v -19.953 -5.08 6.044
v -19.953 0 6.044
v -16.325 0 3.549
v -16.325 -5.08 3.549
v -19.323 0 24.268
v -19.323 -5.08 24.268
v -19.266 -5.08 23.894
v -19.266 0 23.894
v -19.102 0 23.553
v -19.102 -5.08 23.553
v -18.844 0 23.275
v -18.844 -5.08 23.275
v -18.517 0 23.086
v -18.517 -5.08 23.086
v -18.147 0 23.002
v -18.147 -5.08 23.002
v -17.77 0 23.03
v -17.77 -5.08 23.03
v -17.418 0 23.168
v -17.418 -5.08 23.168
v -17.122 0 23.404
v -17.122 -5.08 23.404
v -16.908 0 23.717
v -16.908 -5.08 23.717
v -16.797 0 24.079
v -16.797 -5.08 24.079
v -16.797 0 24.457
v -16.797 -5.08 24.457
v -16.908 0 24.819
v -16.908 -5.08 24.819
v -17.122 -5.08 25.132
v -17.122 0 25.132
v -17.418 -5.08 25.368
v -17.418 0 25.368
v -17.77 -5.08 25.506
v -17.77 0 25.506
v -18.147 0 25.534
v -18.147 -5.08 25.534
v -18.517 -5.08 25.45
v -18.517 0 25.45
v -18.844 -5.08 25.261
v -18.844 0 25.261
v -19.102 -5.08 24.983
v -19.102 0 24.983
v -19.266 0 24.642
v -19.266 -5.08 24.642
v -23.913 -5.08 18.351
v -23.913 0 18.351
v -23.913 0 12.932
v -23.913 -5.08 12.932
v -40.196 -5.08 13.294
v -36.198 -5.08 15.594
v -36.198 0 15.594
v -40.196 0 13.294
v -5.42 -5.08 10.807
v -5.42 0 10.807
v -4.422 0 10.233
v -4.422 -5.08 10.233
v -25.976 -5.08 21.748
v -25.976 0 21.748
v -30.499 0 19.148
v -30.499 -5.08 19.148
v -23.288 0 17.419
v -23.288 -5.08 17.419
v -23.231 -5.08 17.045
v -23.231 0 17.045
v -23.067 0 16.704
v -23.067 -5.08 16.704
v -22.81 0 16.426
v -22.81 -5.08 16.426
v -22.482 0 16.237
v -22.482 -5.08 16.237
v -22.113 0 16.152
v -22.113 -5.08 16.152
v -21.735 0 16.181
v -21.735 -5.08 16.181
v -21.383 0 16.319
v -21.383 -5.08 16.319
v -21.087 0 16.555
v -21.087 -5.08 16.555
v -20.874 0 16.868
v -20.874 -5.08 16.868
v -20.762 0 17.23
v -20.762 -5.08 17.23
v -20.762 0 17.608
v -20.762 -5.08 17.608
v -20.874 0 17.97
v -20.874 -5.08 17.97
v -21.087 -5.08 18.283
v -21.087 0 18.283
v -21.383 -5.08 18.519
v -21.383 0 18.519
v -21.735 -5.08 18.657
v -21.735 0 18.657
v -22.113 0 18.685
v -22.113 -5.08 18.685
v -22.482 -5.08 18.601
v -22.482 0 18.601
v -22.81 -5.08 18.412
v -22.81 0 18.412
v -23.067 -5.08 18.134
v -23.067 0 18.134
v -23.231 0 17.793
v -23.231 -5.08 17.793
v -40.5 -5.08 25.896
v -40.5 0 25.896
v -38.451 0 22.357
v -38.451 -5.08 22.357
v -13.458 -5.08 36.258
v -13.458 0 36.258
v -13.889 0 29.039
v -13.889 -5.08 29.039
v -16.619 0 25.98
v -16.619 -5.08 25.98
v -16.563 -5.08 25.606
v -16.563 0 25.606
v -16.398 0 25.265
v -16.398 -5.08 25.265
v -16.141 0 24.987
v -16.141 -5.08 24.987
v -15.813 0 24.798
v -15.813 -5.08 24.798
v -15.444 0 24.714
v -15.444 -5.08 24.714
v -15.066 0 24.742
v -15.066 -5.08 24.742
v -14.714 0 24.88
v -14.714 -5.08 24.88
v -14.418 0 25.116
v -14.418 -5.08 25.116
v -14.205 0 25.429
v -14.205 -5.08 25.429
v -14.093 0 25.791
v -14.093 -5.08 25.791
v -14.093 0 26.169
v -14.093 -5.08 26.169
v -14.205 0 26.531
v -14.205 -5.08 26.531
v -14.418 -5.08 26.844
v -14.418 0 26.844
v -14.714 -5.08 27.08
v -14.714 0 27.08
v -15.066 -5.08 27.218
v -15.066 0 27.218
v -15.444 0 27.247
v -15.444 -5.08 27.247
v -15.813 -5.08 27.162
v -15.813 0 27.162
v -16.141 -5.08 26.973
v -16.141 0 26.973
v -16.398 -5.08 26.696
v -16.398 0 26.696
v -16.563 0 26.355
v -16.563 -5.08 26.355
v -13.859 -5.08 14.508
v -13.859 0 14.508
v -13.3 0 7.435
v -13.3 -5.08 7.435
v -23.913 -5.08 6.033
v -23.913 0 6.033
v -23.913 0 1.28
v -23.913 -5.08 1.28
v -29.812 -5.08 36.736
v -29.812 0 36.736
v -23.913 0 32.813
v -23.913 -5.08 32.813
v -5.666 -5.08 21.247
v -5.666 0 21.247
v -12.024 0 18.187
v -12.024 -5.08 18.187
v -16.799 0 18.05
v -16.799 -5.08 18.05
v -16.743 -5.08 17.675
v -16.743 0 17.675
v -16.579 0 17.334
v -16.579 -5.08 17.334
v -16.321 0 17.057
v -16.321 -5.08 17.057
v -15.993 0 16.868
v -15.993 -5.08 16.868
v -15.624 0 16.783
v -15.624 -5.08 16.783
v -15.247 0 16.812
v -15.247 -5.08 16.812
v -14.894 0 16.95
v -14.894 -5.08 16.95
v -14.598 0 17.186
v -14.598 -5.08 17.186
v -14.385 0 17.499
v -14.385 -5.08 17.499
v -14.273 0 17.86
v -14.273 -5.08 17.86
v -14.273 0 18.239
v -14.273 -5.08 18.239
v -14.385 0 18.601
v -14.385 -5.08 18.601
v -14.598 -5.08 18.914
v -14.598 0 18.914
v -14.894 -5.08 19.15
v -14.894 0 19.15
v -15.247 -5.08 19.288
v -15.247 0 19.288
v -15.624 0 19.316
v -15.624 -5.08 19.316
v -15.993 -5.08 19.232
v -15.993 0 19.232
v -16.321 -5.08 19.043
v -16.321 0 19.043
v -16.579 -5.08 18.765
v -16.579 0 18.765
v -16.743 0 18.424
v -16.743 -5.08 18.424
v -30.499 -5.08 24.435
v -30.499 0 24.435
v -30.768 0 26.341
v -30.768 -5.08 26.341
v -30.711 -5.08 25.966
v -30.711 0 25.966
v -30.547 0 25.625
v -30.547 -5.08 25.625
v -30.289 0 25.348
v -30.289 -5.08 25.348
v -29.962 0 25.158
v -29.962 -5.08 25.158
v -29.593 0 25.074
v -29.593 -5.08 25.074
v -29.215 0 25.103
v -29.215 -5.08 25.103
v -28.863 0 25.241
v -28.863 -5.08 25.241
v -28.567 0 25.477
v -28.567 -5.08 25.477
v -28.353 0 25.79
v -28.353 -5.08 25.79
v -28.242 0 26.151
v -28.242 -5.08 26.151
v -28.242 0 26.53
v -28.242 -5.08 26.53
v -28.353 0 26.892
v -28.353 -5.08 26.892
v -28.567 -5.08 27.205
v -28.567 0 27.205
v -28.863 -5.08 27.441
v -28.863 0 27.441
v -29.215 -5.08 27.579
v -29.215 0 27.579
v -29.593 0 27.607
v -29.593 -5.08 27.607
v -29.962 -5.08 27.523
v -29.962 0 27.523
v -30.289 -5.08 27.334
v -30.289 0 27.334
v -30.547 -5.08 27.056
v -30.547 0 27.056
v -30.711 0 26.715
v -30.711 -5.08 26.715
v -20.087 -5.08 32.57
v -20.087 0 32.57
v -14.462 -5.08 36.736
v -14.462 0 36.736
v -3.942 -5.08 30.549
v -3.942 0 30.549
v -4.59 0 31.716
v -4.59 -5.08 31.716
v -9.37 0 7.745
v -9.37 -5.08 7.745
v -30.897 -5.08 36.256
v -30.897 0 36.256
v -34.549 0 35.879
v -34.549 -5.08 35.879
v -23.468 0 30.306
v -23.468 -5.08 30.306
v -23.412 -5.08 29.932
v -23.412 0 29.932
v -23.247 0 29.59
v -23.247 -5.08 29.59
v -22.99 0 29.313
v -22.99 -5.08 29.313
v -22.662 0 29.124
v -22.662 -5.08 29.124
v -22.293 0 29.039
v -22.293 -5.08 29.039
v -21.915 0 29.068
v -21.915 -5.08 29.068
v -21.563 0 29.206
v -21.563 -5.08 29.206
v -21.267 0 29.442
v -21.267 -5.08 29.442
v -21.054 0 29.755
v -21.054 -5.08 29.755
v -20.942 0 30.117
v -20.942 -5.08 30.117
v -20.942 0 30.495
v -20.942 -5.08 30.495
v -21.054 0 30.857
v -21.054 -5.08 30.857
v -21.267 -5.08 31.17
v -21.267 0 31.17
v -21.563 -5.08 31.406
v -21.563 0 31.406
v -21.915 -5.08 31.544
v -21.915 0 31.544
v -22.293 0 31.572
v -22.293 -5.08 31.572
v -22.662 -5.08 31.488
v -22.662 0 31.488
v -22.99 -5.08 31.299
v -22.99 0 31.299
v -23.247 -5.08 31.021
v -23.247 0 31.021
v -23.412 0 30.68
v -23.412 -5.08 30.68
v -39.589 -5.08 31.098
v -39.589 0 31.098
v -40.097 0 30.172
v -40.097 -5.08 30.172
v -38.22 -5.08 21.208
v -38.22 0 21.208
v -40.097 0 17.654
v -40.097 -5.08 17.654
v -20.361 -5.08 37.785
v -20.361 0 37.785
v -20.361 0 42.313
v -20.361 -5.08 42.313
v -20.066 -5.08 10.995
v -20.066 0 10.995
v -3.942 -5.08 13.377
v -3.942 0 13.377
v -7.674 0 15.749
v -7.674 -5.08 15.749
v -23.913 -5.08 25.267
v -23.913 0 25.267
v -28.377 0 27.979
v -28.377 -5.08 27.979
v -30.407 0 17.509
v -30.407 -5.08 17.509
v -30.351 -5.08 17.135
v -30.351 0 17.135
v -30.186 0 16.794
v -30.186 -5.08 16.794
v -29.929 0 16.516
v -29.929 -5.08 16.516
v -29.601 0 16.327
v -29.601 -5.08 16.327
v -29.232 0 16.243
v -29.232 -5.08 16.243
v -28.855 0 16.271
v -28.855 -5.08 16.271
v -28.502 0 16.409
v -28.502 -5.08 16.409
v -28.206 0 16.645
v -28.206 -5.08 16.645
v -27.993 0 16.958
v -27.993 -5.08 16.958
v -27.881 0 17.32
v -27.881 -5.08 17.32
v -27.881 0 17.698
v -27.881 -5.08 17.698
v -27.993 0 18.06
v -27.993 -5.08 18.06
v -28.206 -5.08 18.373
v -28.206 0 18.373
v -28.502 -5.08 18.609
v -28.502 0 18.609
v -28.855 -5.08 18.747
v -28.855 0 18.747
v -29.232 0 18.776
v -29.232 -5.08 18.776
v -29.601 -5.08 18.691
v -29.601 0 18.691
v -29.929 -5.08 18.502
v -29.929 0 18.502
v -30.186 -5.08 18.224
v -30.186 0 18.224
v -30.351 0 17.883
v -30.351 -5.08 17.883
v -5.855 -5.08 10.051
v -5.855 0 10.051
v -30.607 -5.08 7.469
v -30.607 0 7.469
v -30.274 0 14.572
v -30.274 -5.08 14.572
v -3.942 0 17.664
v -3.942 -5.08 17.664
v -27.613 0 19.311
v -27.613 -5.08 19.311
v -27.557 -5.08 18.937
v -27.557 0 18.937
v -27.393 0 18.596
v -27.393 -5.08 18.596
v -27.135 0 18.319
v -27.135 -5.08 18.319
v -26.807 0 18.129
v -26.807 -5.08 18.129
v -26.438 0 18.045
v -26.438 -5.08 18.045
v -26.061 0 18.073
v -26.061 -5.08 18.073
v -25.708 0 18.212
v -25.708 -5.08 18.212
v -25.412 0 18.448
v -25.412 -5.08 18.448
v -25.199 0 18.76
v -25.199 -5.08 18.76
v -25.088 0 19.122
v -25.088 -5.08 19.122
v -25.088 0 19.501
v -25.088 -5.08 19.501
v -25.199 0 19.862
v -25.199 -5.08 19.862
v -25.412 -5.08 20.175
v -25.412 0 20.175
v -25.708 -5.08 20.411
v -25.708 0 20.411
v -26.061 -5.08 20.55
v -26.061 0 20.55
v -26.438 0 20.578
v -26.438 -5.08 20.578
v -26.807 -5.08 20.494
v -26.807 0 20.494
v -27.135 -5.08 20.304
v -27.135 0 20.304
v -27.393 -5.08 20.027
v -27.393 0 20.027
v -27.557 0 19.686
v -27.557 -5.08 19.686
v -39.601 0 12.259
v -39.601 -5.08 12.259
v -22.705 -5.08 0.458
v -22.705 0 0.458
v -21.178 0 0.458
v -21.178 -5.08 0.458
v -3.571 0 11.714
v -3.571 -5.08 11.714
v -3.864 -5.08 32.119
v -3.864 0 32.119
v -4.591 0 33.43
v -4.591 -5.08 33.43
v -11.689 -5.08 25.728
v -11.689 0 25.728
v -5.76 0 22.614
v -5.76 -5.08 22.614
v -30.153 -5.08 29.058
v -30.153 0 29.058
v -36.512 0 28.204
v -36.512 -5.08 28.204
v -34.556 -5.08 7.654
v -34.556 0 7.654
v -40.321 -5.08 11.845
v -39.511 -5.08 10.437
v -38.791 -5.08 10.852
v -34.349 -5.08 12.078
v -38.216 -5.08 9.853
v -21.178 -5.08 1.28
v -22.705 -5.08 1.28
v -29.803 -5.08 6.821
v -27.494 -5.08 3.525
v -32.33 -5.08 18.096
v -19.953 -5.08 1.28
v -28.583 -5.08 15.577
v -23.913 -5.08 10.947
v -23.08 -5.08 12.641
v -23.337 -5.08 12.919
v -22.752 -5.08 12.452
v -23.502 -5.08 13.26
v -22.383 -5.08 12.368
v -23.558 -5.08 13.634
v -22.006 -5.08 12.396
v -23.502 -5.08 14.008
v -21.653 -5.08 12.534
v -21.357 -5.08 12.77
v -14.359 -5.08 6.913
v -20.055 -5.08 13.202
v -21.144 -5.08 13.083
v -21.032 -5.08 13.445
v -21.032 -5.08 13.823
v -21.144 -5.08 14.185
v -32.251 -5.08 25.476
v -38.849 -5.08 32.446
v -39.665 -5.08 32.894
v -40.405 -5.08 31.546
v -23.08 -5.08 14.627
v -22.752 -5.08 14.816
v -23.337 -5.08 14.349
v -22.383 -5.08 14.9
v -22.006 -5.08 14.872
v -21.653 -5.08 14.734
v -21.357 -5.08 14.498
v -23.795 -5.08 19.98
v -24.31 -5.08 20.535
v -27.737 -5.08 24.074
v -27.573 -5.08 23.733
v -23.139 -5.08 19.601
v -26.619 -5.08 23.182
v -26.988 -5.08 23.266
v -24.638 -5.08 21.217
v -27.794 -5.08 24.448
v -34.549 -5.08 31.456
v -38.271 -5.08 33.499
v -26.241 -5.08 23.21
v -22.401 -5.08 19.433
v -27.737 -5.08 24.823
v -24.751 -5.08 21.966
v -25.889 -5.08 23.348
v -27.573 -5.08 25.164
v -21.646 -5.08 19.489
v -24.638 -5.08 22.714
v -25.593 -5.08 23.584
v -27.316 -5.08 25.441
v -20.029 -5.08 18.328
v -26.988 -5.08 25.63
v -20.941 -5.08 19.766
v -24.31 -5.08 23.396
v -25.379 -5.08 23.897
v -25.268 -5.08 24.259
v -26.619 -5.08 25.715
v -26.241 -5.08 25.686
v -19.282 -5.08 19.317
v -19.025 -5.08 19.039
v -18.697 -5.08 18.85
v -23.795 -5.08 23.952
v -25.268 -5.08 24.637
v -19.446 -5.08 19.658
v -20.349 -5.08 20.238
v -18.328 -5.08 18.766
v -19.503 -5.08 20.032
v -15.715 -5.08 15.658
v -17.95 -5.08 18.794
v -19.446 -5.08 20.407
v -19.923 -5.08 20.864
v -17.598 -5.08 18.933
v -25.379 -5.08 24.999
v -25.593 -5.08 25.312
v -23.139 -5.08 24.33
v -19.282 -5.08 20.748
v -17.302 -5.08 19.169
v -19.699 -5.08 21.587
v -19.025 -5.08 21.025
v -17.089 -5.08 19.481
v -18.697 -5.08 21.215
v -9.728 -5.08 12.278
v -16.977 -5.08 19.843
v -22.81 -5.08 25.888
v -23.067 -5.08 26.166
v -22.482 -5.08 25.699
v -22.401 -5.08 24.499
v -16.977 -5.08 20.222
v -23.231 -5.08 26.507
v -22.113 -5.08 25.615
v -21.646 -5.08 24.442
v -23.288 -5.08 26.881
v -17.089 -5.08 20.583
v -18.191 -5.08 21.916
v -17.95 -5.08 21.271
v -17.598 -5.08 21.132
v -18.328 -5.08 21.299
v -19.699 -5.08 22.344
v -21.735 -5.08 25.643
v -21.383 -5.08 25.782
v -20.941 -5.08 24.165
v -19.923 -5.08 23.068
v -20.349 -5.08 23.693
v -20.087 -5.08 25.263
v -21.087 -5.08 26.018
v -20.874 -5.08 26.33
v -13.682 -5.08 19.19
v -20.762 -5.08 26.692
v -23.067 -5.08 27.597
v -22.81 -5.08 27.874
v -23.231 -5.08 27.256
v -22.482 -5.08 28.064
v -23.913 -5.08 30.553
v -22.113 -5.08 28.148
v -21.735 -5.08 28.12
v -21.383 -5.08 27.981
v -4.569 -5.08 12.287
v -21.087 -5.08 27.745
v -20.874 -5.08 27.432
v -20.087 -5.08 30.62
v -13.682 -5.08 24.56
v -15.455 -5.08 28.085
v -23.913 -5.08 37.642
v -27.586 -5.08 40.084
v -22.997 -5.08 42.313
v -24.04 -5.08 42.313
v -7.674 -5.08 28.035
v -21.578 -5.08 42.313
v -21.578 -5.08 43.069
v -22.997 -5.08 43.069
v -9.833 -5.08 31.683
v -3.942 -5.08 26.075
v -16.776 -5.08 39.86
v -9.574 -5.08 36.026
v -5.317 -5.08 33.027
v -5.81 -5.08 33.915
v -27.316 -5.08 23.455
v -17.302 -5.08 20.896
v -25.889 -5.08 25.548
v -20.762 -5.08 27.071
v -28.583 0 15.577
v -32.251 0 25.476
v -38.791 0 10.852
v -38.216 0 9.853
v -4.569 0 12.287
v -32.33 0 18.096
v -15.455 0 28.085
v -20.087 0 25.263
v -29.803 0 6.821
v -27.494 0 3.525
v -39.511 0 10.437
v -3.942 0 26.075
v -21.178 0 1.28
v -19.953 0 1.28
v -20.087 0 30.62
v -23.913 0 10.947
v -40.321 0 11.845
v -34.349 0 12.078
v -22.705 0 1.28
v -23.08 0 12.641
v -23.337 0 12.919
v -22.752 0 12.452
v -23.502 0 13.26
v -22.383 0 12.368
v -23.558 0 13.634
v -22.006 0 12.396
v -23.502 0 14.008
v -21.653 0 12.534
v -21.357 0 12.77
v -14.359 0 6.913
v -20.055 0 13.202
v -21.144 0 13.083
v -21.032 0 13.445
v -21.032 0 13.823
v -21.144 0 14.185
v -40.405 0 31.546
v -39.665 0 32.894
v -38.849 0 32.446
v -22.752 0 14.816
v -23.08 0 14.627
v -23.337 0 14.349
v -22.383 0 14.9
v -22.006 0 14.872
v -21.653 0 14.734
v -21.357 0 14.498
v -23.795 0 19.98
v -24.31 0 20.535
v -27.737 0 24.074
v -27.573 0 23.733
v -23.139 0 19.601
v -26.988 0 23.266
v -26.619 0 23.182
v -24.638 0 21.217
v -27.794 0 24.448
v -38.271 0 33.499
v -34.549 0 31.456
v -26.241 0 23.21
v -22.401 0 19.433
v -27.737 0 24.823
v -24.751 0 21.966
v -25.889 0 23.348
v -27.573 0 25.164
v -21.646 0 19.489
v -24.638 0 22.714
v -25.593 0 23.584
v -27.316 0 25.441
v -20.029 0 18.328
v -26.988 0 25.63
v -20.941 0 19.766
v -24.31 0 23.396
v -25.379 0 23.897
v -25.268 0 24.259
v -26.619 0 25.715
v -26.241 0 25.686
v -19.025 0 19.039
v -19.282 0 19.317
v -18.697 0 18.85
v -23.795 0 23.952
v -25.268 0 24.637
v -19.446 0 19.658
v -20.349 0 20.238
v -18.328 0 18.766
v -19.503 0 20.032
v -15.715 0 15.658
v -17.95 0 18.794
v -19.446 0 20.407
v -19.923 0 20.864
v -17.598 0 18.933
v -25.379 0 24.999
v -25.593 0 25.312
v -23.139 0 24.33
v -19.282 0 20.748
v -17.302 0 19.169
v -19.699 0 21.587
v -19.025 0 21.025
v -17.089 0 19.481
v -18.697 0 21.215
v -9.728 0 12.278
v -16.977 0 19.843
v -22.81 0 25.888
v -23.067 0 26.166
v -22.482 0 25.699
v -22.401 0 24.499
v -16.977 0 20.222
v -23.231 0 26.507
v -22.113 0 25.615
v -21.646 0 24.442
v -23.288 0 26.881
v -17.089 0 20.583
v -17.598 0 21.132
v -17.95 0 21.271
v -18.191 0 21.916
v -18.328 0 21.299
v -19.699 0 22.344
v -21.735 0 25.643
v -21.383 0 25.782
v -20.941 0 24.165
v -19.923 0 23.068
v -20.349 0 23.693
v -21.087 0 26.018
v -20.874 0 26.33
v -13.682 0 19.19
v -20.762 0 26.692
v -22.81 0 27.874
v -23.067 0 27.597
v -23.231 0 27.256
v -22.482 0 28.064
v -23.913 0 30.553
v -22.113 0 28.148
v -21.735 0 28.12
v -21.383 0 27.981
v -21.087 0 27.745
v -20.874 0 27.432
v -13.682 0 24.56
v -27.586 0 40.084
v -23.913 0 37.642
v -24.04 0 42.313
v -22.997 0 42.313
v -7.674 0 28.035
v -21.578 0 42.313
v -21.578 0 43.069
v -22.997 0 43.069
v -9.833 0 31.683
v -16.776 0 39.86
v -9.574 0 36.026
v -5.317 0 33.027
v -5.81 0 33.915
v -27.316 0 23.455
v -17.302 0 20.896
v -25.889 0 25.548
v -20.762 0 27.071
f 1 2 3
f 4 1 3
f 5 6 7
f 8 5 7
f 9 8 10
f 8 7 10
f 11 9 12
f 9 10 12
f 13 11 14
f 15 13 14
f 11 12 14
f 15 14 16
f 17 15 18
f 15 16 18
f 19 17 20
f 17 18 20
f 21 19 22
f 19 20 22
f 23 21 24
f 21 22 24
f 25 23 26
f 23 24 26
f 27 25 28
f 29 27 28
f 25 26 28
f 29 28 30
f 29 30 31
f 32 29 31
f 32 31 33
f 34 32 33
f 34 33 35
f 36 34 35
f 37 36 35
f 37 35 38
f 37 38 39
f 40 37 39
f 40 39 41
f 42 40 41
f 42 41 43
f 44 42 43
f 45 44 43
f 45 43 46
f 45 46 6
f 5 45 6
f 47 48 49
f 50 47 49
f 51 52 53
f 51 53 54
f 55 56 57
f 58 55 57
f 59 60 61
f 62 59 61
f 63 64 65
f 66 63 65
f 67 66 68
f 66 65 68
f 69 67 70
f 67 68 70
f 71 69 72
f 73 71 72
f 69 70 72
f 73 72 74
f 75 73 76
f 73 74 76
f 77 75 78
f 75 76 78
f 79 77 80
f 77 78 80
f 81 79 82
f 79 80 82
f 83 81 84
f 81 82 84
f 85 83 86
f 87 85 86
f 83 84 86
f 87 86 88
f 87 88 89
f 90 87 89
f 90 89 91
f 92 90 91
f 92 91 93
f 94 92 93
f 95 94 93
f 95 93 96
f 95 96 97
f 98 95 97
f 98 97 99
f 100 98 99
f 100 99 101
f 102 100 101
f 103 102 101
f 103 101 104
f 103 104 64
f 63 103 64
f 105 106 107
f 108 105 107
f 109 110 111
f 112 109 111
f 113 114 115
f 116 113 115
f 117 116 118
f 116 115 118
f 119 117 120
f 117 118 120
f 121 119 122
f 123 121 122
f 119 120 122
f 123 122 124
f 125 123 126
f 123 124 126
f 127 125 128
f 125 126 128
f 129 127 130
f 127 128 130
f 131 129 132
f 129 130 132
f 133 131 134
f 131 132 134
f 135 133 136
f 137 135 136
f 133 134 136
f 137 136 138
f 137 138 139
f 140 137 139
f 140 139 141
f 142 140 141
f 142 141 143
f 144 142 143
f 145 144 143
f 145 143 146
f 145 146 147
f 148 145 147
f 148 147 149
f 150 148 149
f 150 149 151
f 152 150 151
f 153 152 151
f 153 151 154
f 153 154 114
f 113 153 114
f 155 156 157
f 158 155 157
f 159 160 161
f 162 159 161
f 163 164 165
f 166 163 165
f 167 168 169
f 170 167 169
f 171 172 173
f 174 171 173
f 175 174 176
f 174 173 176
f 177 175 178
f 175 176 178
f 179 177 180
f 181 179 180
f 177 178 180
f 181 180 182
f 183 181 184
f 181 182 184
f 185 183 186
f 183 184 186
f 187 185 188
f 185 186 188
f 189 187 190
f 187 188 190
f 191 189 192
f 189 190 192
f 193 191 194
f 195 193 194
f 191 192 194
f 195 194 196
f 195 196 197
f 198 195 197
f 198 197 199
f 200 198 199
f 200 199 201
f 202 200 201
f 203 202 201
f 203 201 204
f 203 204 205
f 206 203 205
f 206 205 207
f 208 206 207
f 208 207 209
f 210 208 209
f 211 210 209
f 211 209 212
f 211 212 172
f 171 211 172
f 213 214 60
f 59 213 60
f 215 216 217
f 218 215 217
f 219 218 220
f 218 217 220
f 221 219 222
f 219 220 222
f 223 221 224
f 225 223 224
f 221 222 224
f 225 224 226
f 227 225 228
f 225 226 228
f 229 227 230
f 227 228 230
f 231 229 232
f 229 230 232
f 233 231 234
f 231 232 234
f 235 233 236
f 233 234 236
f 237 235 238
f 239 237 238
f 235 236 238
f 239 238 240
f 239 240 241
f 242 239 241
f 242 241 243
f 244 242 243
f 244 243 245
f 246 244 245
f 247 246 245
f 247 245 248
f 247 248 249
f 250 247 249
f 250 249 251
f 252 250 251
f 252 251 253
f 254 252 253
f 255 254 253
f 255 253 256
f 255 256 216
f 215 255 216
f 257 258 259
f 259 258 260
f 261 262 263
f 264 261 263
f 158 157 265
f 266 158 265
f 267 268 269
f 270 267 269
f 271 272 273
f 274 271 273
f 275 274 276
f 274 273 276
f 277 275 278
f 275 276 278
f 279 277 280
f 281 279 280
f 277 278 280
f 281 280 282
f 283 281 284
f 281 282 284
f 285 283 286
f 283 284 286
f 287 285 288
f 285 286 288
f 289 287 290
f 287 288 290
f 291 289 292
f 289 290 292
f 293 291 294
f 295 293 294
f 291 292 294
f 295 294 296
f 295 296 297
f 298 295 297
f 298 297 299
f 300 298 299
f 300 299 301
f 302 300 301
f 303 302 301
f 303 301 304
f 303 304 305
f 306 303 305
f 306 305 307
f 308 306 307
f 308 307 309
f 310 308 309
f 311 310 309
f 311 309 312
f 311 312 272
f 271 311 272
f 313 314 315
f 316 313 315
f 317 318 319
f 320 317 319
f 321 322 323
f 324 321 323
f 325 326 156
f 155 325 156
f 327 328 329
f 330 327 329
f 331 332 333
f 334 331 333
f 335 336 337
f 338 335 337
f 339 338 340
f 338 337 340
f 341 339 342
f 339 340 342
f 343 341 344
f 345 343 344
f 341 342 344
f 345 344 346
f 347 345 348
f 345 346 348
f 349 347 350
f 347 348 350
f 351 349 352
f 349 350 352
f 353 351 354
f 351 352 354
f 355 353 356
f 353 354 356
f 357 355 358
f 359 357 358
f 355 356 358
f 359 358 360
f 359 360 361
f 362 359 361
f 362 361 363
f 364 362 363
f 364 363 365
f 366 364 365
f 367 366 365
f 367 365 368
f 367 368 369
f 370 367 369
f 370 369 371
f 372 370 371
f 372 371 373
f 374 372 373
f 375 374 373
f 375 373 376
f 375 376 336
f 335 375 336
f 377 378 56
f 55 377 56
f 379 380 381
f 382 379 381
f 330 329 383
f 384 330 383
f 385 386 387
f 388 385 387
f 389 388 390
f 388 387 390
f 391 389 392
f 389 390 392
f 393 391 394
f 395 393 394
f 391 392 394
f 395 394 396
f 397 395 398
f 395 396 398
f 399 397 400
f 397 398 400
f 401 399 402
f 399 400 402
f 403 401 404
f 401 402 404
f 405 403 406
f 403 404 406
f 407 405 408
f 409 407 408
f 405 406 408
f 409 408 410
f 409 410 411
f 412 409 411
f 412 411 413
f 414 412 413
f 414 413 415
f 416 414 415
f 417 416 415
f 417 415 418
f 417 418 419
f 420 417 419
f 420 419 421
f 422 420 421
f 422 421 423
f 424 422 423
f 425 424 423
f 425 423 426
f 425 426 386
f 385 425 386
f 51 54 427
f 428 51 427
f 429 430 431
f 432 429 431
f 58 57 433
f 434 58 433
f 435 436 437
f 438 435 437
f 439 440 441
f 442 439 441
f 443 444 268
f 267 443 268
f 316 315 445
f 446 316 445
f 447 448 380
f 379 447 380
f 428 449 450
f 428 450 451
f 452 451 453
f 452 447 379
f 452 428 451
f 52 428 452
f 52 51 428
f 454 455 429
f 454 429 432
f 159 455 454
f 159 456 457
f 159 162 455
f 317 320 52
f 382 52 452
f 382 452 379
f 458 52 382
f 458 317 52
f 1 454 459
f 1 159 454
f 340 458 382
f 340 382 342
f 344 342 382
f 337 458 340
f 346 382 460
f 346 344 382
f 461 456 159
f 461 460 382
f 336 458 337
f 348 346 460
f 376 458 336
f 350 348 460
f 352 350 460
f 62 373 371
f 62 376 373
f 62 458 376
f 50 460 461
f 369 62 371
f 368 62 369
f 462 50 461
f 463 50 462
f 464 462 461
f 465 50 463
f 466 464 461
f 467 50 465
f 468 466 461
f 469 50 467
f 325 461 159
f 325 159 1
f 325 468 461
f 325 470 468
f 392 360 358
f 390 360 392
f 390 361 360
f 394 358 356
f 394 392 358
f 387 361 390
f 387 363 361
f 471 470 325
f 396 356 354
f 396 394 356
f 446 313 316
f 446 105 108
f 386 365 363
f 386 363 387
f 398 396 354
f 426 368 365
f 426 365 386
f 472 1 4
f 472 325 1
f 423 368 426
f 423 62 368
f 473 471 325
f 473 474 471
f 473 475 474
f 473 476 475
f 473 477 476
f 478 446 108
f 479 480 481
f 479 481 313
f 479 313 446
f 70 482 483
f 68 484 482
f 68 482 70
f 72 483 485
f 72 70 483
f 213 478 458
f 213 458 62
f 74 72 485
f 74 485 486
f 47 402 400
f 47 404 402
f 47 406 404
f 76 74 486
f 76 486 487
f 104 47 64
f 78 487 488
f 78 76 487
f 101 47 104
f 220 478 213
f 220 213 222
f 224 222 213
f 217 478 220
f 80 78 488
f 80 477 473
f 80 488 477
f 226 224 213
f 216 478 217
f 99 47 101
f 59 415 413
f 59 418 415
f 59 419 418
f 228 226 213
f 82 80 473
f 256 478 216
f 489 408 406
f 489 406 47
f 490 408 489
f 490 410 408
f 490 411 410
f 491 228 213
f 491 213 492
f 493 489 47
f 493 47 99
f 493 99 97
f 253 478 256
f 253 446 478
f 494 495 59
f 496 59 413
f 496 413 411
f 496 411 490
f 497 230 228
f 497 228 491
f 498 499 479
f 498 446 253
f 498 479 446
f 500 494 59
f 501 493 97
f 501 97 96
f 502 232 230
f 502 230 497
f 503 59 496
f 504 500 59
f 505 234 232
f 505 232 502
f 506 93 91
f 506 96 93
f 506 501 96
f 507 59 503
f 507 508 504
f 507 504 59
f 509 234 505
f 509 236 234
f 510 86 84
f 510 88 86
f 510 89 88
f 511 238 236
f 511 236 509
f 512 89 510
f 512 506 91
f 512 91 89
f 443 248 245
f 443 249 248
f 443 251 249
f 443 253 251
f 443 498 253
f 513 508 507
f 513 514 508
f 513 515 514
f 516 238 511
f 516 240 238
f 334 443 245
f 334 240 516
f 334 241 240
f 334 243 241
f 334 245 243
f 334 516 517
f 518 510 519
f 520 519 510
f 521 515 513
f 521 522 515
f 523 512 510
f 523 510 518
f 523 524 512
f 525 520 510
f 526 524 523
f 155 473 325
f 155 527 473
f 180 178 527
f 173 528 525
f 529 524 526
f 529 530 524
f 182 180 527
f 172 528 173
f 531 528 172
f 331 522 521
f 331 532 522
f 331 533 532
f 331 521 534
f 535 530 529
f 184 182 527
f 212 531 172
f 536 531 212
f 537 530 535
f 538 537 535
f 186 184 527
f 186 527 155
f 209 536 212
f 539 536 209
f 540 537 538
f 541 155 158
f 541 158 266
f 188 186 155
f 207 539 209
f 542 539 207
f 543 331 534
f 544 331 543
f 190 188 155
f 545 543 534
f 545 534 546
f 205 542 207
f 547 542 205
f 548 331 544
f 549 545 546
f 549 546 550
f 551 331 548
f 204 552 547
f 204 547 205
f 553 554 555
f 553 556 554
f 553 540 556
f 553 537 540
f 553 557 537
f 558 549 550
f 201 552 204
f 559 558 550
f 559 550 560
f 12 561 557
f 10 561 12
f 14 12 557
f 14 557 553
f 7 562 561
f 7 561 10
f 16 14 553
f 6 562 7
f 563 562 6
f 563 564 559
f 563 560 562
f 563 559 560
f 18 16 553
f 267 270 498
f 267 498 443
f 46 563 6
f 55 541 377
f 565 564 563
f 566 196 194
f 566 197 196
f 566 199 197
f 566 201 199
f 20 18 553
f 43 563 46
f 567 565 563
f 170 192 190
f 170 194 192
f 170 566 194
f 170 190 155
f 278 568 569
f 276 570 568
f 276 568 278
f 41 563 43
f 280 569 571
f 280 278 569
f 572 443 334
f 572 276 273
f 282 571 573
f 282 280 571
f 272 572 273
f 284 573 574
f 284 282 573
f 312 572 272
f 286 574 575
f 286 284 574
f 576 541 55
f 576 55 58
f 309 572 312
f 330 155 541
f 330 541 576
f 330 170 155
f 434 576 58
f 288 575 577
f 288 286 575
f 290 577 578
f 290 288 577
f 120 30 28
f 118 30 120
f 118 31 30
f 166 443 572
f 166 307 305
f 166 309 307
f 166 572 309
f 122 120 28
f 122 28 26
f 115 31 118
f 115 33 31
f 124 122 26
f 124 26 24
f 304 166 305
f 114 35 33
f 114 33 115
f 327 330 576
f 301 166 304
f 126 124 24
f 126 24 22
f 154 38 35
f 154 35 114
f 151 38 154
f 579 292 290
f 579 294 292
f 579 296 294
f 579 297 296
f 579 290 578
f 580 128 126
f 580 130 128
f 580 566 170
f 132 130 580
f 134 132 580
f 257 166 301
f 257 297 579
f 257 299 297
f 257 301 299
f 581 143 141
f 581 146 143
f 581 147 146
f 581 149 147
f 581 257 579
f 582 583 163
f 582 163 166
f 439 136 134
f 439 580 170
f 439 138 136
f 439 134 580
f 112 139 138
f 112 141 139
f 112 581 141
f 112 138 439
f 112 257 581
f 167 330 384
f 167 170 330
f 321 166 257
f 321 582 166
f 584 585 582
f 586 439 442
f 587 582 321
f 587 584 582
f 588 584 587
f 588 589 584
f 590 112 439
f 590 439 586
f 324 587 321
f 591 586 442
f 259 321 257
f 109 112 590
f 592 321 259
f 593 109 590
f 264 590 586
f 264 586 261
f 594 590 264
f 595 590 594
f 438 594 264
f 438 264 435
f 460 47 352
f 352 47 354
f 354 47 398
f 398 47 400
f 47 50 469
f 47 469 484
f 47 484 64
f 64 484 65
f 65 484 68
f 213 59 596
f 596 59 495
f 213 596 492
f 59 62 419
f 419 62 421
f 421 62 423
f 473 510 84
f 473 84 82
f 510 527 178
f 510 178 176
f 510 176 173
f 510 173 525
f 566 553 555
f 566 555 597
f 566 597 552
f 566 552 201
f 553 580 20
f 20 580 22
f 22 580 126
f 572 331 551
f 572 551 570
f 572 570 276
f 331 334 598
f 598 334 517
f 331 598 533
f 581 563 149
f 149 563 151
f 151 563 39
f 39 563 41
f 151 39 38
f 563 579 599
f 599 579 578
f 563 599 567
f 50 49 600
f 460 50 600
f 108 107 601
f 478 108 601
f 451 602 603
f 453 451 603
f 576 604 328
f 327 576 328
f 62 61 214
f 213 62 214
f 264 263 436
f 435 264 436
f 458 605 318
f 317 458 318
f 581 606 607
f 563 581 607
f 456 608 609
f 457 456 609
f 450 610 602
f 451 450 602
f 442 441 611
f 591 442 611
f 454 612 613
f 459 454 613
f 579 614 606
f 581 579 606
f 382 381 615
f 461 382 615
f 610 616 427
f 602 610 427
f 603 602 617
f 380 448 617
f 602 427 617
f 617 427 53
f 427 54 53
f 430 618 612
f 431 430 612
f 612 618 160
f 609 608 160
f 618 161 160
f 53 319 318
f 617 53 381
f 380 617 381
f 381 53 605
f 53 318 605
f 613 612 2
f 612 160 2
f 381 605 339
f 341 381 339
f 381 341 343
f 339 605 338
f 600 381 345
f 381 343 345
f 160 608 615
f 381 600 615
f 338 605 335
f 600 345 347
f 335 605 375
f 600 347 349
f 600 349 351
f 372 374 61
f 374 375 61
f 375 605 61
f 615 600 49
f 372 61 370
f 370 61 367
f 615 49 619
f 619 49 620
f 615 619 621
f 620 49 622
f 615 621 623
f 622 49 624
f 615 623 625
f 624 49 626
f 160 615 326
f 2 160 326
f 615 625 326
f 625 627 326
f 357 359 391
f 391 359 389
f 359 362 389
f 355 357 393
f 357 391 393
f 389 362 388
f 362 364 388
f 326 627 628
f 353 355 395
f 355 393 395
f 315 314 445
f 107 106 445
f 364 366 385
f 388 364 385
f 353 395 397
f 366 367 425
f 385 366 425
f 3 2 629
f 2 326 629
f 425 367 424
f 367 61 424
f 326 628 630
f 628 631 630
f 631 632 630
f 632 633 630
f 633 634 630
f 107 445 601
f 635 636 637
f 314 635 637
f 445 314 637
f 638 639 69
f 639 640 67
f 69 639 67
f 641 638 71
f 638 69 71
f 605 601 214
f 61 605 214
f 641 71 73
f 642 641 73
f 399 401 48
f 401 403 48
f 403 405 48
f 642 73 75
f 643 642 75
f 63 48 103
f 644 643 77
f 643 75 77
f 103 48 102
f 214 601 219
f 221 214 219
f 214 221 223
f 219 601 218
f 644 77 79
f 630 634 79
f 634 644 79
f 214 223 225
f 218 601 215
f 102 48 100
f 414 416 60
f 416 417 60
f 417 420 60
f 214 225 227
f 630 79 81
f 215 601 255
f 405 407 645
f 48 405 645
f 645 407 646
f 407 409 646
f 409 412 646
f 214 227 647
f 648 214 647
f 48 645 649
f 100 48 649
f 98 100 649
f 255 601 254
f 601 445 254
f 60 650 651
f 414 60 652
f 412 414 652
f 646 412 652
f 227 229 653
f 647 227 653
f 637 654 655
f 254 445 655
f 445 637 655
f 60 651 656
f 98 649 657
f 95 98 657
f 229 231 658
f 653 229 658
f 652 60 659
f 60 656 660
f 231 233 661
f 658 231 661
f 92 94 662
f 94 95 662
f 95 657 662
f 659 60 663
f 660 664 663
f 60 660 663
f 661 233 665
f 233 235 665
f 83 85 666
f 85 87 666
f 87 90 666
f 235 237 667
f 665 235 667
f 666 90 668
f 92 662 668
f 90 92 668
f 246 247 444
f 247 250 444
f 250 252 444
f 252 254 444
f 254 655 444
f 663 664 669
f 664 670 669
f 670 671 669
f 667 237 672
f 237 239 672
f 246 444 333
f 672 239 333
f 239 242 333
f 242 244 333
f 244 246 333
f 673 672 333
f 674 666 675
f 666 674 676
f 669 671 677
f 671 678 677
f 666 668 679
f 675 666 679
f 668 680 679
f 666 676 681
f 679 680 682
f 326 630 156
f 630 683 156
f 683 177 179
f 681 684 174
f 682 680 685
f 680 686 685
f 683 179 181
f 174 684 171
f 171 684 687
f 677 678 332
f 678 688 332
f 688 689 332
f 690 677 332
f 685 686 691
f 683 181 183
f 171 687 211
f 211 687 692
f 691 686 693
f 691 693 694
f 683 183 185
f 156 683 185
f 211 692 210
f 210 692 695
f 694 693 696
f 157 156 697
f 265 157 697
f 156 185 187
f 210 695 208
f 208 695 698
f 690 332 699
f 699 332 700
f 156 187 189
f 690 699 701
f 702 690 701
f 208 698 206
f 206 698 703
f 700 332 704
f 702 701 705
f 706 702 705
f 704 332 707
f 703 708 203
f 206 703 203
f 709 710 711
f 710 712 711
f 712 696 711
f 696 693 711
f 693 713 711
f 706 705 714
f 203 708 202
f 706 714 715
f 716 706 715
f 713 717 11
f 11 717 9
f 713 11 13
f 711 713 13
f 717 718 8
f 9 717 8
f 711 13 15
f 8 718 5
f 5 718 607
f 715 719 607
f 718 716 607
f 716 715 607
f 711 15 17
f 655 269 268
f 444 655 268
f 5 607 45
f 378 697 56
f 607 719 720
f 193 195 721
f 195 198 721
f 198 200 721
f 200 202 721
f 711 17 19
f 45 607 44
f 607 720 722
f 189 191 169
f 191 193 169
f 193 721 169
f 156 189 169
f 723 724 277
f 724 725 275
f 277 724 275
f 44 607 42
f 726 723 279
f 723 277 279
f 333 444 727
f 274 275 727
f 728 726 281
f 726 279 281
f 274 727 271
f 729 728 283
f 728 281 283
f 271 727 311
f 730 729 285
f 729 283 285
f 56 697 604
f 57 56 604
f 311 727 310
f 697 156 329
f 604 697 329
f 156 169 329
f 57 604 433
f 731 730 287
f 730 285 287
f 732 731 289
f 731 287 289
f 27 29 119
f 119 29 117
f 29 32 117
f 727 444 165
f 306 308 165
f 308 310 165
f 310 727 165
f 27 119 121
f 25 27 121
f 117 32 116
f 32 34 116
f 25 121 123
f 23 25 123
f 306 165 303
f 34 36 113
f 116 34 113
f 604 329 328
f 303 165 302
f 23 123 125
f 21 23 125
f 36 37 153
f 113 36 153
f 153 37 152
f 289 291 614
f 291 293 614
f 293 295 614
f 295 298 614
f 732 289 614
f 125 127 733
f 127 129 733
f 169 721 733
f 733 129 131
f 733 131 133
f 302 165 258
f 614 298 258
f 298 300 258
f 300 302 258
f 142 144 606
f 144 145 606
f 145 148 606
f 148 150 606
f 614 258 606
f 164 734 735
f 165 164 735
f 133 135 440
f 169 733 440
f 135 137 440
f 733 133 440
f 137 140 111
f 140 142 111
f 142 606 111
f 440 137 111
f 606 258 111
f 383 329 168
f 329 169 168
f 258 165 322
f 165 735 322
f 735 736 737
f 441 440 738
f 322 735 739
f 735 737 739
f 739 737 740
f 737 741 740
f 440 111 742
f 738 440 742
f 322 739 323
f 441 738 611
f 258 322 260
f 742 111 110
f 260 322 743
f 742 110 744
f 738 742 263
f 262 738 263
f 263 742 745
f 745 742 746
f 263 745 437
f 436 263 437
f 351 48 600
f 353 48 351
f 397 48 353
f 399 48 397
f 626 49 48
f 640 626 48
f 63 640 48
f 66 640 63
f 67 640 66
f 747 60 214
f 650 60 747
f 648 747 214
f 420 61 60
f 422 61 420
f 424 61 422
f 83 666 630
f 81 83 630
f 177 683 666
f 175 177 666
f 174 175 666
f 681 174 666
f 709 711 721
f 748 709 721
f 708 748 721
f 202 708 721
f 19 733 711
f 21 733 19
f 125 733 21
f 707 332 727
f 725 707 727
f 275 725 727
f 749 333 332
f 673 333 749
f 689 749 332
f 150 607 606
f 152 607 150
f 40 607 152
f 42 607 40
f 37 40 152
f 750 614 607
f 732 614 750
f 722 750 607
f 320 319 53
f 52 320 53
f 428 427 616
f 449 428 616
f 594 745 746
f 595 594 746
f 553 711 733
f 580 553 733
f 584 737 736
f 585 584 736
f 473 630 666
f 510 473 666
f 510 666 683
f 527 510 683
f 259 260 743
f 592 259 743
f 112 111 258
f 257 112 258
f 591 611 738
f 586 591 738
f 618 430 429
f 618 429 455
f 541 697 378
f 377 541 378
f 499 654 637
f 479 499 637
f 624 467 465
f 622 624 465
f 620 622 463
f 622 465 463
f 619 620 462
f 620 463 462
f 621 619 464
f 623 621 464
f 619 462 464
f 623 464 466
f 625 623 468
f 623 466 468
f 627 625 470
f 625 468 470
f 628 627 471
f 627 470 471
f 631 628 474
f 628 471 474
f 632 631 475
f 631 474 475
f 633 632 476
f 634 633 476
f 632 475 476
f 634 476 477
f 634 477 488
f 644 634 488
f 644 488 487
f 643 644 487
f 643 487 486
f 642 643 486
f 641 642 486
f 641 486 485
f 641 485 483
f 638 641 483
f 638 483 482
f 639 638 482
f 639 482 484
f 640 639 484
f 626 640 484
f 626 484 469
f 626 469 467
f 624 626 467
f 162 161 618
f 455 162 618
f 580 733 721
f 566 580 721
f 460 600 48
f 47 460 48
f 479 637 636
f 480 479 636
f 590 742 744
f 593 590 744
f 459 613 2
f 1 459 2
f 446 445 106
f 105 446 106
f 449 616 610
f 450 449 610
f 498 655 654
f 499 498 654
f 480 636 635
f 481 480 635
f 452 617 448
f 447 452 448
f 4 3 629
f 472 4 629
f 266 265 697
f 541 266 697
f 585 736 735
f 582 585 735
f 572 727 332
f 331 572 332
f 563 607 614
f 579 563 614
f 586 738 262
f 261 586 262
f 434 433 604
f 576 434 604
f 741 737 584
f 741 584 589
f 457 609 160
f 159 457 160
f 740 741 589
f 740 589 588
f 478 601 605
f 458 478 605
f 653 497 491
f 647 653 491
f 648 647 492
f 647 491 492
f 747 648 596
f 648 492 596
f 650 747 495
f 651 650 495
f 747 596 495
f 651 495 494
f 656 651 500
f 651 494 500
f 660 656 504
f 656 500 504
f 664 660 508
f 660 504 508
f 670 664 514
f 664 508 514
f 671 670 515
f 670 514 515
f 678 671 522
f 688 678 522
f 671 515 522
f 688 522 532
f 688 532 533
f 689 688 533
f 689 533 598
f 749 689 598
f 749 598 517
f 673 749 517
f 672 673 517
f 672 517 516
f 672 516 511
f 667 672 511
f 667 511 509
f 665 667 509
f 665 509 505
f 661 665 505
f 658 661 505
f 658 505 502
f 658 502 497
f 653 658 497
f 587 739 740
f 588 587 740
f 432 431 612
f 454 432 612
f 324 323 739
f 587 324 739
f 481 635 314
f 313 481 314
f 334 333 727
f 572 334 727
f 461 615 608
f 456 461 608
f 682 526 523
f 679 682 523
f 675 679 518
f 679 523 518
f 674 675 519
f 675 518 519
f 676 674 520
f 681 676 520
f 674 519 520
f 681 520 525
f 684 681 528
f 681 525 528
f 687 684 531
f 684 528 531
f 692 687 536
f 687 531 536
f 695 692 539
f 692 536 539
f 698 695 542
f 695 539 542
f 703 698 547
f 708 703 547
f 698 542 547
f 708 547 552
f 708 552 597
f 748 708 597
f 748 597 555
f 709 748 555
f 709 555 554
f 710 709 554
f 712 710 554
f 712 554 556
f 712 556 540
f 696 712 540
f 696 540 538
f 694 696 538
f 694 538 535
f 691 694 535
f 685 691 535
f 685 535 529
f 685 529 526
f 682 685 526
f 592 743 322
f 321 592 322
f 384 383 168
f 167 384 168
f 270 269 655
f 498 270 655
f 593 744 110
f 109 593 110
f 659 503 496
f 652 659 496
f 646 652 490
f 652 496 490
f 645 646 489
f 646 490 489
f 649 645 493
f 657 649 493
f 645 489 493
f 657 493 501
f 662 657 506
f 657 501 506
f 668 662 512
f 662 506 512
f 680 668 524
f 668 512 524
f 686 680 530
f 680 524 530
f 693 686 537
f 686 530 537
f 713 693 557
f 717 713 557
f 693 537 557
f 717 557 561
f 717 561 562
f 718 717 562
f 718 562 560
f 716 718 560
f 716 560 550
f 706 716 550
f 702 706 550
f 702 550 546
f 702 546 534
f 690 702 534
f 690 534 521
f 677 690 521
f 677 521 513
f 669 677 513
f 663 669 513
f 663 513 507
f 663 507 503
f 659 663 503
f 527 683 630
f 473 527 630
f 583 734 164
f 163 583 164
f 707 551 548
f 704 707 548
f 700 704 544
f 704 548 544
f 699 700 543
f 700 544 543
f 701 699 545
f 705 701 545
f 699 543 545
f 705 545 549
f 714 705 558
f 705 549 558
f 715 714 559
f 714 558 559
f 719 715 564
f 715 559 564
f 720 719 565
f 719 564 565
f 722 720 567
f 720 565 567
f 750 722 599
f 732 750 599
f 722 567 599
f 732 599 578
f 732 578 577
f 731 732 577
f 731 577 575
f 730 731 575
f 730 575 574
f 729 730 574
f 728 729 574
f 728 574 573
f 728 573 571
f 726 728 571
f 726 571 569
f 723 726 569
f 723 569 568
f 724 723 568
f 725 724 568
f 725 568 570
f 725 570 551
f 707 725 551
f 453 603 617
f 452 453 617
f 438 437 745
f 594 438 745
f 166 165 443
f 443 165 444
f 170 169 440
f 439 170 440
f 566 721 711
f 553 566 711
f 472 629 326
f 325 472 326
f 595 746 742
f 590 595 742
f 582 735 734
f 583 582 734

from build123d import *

# Parameters (mm, degrees)
F0_W     = 1.4192797244
F0_H     = 0.7559135556
F0_W_2   = 1.5276372433
F0_H_2   = 0.821922149
F1_DEPTH = 5.08
F3_D     = 5.08
F16_D    = 2.54
F17_D    = 2.54
F18_D    = 2.54
F19_D    = 2.54
F20_D    = 2.54
F21_D    = 2.54
F22_D    = 2.54
F23_D    = 2.54
F24_D    = 2.54
F25_D    = 2.54
F26_D    = 2.54
F27_D    = 2.54


with BuildPart() as f1:
    # F0 (on Front) → F1 (new body)
    with BuildSketch(Plane.XZ):
        Polygon((-22.9968726635, 42.3126220703), (-24.0396112204, 42.3126220703), (-23.9130631089, 37.6422533683), (-27.5855498346, 40.0842883347), (-29.8122577369, 36.7356240749), (-23.9130631089, 32.8129306436), (-23.9130631089, 30.5526573211), (-23.9130631089, 25.2665821463), (-28.3773863184, 27.9790678606), (-30.1533350523, 29.0581195654), (-30.897045508, 36.2559482455), (-34.5488109312, 35.8786322176), (-34.5488109312, 31.4557254833), (-38.2708328584, 33.4987355549), (-38.8486688201, 32.4460152822), (-39.5886734839, 31.0978508149), (-40.0970317423, 30.1717072725), (-36.5123793412, 28.2040990472), (-40.4995033926, 25.8957650515), (-38.450665772, 22.3568622023), (-32.2511233389, 25.4756510258), (-30.4993555618, 24.4352070583), (-25.9755142033, 21.7483192682), (-30.4993555618, 19.148359909), (-32.3296703771, 18.0964343976), (-38.2196328624, 21.207898243), (-40.0970317423, 17.6540054381), (-36.1978308162, 15.5941921986), (-40.1960664707, 13.2942146556), (-39.6006508042, 12.2591557897), (-38.790906044, 10.8515114494), (-38.2163748145, 9.8527576774), (-34.3487829088, 12.0775826495), (-34.5557542526, 7.6535682905), (-30.6067895144, 7.4688214809), (-30.2744992077, 14.5715298131), (-28.5829074003, 15.5766311017), (-23.9130631089, 18.3513350785), (-23.9130631089, 12.9318498075), (-23.9130631089, 10.946790142), (-29.8032763032, 6.8207080641), (-27.4943839759, 3.5246349871), (-23.9130631089, 6.0333427973), (-23.9130631089, 1.2797450181), (-22.7054376155, 1.2797450181), (-21.1778003722, 1.2797450181), (-19.952988252, 1.2797450181), (-19.952988252, 6.044047419), (-16.3245014846, 3.5494628828), (-14.3590718508, 6.9133723155), (-20.0663805008, 10.9954206273), (-20.0550059627, 13.2019692024), (-20.0285818428, 18.3279886842), (-15.7154238075, 15.6576944664), (-13.8587799241, 14.5082384562), (-13.3001293296, 7.4345099906), (-9.3699013814, 7.7449013479), (-9.7278654156, 12.2775025894), (-5.8548050001, 10.0505026057), (-5.4199136441, 10.8068387119), (-4.568640864, 12.2873195971), (-3.9422987452, 13.3766150102), (-7.6739792712, 15.7493855804), (-3.9422987452, 17.6644706865), (-5.6661837734, 21.2469194084), (-12.0242014527, 18.1874223053), (-13.6816729537, 19.189614399), (-18.1910004467, 21.9161845744), (-13.6816729537, 24.5599445899), (-11.6887243355, 25.7283844245), (-5.7599901473, 22.6144351328), (-3.9422987452, 26.0751880705), (-7.6739792712, 28.0351787806), (-3.9422987452, 30.5491588676), (-4.5895827798, 31.7159527215), (-5.3169873732, 33.0271718518), (-5.809597671, 33.9151509106), (-9.8331745535, 31.6830538959), (-9.5743191002, 36.0260785228), (-13.4583404288, 36.2575761974), (-13.8885816559, 29.0390755981), (-15.4547147461, 28.084917372), (-20.0873508675, 25.2625085413), (-20.0873508675, 30.6201688945), (-20.0873508675, 32.5695575383), (-14.4622381777, 36.7356240749), (-16.7762544006, 39.8600585759), (-20.3607678413, 37.7848148346), (-20.3607678413, 42.3126220703), (-21.5775929391, 42.3126220703), align=None)
        with Locations((-22.2872328013, 42.6905788481)):
            Rectangle(F0_W, F0_H)
        Polygon((-23.9130631089, 30.5526573211), (-23.9130631089, 32.8129306436), (-30.1533350523, 29.0581195654), (-28.3773863184, 27.9790678606), align=None)
        Polygon((-13.8885816559, 29.0390755981), (-20.0873508675, 32.5695575383), (-20.0873508675, 30.6201688945), (-15.4547147461, 28.084917372), align=None)
        Polygon((-39.5886734839, 31.0978508149), (-38.8486688201, 32.4460152822), (-39.664609785, 32.8938835758), (-40.4046144488, 31.5457191085), align=None)
        Polygon((-4.5909064128, 33.4299684657), (-5.3169873732, 33.0271718518), (-4.5895827798, 31.7159527215), (-3.8635018193, 32.1187493355), align=None)
        Polygon((-30.4993555618, 24.4352070583), (-32.2511233389, 25.4756510258), (-32.3296703771, 18.0964343976), (-30.4993555618, 19.148359909), align=None)
        Polygon((-12.0242014527, 18.1874223053), (-11.6887243355, 25.7283844245), (-13.6816729537, 24.5599445899), (-13.6816729537, 19.189614399), align=None)
        Polygon((-38.790906044, 10.8515114494), (-39.6006508042, 12.2591557897), (-40.3208764938, 11.8448473159), (-39.5111317337, 10.4372029756), align=None)
        Polygon((-3.5707916424, 11.713558808), (-4.568640864, 12.2873195971), (-5.4199136441, 10.8068387119), (-4.4220644224, 10.2330779228), align=None)
        Polygon((-28.5829074003, 15.5766311017), (-30.2744992077, 14.5715298131), (-23.9130631089, 10.946790142), (-23.9130631089, 12.9318498075), align=None)
        Polygon((-20.0663805008, 10.9954206273), (-13.8587799241, 14.5082384562), (-15.7154238075, 15.6576944664), (-20.0550059627, 13.2019692024), align=None)
        with Locations((-21.9416189939, 0.8687839436)):
            Rectangle(F0_W_2, F0_H_2)
    extrude(amount=F1_DEPTH)

    # F3 (through all)
    with Locations(Plane(origin=(0, 0, 0), x_dir=(1, 0, 0), z_dir=(0, 1, 0))):
        with Locations((-22.2109630704, -21.9656527042)):
            Hole(F3_D / 2)

    # F16 (through all)
    with Locations(Plane(origin=(0, 0, 0), x_dir=(1, 0, 0), z_dir=(0, 1, 0))):
        with Locations((-22.1980046481, -30.305903405)):
            Hole(F16_D / 2)

    # F17 (through all)
    with Locations(Plane(origin=(0, 0, 0), x_dir=(1, 0, 0), z_dir=(0, 1, 0))):
        with Locations((-22.0177676529, -26.8813967705)):
            Hole(F17_D / 2)

    # F18 (through all)
    with Locations(Plane(origin=(0, 0, 0), x_dir=(1, 0, 0), z_dir=(0, 1, 0))):
        with Locations((-18.0525481701, -24.2679584771)):
            Hole(F18_D / 2)

    # F19 (through all)
    with Locations(Plane(origin=(0, 0, 0), x_dir=(1, 0, 0), z_dir=(0, 1, 0))):
        with Locations((-15.3489904478, -25.9802117944)):
            Hole(F19_D / 2)

    # F20 (through all)
    with Locations(Plane(origin=(0, 0, 0), x_dir=(1, 0, 0), z_dir=(0, 1, 0))):
        with Locations((-18.2327851653, -20.0323835015)):
            Hole(F20_D / 2)

    # F21 (through all)
    with Locations(Plane(origin=(0, 0, 0), x_dir=(1, 0, 0), z_dir=(0, 1, 0))):
        with Locations((-15.529227443, -18.0497746915)):
            Hole(F21_D / 2)

    # F22 (through all)
    with Locations(Plane(origin=(0, 0, 0), x_dir=(1, 0, 0), z_dir=(0, 1, 0))):
        with Locations((-22.0177676529, -17.4189452082)):
            Hole(F22_D / 2)

    # F23 (through all)
    with Locations(Plane(origin=(0, 0, 0), x_dir=(1, 0, 0), z_dir=(0, 1, 0))):
        with Locations((-22.2881231457, -13.633963652)):
            Hole(F23_D / 2)

    # F24 (through all)
    with Locations(Plane(origin=(0, 0, 0), x_dir=(1, 0, 0), z_dir=(0, 1, 0))):
        with Locations((-26.3434592634, -19.3114355206)):
            Hole(F24_D / 2)

    # F25 (through all)
    with Locations(Plane(origin=(0, 0, 0), x_dir=(1, 0, 0), z_dir=(0, 1, 0))):
        with Locations((-29.1371364146, -17.5090637058)):
            Hole(F25_D / 2)

    # F26 (through all)
    with Locations(Plane(origin=(0, 0, 0), x_dir=(1, 0, 0), z_dir=(0, 1, 0))):
        with Locations((-26.5236981213, -24.4481954724)):
            Hole(F26_D / 2)

    # F27 (through all)
    with Locations(Plane(origin=(0, 0, 0), x_dir=(1, 0, 0), z_dir=(0, 1, 0))):
        with Locations((-29.4976104051, -26.3406857848)):
            Hole(F27_D / 2)


solid = f1.part
